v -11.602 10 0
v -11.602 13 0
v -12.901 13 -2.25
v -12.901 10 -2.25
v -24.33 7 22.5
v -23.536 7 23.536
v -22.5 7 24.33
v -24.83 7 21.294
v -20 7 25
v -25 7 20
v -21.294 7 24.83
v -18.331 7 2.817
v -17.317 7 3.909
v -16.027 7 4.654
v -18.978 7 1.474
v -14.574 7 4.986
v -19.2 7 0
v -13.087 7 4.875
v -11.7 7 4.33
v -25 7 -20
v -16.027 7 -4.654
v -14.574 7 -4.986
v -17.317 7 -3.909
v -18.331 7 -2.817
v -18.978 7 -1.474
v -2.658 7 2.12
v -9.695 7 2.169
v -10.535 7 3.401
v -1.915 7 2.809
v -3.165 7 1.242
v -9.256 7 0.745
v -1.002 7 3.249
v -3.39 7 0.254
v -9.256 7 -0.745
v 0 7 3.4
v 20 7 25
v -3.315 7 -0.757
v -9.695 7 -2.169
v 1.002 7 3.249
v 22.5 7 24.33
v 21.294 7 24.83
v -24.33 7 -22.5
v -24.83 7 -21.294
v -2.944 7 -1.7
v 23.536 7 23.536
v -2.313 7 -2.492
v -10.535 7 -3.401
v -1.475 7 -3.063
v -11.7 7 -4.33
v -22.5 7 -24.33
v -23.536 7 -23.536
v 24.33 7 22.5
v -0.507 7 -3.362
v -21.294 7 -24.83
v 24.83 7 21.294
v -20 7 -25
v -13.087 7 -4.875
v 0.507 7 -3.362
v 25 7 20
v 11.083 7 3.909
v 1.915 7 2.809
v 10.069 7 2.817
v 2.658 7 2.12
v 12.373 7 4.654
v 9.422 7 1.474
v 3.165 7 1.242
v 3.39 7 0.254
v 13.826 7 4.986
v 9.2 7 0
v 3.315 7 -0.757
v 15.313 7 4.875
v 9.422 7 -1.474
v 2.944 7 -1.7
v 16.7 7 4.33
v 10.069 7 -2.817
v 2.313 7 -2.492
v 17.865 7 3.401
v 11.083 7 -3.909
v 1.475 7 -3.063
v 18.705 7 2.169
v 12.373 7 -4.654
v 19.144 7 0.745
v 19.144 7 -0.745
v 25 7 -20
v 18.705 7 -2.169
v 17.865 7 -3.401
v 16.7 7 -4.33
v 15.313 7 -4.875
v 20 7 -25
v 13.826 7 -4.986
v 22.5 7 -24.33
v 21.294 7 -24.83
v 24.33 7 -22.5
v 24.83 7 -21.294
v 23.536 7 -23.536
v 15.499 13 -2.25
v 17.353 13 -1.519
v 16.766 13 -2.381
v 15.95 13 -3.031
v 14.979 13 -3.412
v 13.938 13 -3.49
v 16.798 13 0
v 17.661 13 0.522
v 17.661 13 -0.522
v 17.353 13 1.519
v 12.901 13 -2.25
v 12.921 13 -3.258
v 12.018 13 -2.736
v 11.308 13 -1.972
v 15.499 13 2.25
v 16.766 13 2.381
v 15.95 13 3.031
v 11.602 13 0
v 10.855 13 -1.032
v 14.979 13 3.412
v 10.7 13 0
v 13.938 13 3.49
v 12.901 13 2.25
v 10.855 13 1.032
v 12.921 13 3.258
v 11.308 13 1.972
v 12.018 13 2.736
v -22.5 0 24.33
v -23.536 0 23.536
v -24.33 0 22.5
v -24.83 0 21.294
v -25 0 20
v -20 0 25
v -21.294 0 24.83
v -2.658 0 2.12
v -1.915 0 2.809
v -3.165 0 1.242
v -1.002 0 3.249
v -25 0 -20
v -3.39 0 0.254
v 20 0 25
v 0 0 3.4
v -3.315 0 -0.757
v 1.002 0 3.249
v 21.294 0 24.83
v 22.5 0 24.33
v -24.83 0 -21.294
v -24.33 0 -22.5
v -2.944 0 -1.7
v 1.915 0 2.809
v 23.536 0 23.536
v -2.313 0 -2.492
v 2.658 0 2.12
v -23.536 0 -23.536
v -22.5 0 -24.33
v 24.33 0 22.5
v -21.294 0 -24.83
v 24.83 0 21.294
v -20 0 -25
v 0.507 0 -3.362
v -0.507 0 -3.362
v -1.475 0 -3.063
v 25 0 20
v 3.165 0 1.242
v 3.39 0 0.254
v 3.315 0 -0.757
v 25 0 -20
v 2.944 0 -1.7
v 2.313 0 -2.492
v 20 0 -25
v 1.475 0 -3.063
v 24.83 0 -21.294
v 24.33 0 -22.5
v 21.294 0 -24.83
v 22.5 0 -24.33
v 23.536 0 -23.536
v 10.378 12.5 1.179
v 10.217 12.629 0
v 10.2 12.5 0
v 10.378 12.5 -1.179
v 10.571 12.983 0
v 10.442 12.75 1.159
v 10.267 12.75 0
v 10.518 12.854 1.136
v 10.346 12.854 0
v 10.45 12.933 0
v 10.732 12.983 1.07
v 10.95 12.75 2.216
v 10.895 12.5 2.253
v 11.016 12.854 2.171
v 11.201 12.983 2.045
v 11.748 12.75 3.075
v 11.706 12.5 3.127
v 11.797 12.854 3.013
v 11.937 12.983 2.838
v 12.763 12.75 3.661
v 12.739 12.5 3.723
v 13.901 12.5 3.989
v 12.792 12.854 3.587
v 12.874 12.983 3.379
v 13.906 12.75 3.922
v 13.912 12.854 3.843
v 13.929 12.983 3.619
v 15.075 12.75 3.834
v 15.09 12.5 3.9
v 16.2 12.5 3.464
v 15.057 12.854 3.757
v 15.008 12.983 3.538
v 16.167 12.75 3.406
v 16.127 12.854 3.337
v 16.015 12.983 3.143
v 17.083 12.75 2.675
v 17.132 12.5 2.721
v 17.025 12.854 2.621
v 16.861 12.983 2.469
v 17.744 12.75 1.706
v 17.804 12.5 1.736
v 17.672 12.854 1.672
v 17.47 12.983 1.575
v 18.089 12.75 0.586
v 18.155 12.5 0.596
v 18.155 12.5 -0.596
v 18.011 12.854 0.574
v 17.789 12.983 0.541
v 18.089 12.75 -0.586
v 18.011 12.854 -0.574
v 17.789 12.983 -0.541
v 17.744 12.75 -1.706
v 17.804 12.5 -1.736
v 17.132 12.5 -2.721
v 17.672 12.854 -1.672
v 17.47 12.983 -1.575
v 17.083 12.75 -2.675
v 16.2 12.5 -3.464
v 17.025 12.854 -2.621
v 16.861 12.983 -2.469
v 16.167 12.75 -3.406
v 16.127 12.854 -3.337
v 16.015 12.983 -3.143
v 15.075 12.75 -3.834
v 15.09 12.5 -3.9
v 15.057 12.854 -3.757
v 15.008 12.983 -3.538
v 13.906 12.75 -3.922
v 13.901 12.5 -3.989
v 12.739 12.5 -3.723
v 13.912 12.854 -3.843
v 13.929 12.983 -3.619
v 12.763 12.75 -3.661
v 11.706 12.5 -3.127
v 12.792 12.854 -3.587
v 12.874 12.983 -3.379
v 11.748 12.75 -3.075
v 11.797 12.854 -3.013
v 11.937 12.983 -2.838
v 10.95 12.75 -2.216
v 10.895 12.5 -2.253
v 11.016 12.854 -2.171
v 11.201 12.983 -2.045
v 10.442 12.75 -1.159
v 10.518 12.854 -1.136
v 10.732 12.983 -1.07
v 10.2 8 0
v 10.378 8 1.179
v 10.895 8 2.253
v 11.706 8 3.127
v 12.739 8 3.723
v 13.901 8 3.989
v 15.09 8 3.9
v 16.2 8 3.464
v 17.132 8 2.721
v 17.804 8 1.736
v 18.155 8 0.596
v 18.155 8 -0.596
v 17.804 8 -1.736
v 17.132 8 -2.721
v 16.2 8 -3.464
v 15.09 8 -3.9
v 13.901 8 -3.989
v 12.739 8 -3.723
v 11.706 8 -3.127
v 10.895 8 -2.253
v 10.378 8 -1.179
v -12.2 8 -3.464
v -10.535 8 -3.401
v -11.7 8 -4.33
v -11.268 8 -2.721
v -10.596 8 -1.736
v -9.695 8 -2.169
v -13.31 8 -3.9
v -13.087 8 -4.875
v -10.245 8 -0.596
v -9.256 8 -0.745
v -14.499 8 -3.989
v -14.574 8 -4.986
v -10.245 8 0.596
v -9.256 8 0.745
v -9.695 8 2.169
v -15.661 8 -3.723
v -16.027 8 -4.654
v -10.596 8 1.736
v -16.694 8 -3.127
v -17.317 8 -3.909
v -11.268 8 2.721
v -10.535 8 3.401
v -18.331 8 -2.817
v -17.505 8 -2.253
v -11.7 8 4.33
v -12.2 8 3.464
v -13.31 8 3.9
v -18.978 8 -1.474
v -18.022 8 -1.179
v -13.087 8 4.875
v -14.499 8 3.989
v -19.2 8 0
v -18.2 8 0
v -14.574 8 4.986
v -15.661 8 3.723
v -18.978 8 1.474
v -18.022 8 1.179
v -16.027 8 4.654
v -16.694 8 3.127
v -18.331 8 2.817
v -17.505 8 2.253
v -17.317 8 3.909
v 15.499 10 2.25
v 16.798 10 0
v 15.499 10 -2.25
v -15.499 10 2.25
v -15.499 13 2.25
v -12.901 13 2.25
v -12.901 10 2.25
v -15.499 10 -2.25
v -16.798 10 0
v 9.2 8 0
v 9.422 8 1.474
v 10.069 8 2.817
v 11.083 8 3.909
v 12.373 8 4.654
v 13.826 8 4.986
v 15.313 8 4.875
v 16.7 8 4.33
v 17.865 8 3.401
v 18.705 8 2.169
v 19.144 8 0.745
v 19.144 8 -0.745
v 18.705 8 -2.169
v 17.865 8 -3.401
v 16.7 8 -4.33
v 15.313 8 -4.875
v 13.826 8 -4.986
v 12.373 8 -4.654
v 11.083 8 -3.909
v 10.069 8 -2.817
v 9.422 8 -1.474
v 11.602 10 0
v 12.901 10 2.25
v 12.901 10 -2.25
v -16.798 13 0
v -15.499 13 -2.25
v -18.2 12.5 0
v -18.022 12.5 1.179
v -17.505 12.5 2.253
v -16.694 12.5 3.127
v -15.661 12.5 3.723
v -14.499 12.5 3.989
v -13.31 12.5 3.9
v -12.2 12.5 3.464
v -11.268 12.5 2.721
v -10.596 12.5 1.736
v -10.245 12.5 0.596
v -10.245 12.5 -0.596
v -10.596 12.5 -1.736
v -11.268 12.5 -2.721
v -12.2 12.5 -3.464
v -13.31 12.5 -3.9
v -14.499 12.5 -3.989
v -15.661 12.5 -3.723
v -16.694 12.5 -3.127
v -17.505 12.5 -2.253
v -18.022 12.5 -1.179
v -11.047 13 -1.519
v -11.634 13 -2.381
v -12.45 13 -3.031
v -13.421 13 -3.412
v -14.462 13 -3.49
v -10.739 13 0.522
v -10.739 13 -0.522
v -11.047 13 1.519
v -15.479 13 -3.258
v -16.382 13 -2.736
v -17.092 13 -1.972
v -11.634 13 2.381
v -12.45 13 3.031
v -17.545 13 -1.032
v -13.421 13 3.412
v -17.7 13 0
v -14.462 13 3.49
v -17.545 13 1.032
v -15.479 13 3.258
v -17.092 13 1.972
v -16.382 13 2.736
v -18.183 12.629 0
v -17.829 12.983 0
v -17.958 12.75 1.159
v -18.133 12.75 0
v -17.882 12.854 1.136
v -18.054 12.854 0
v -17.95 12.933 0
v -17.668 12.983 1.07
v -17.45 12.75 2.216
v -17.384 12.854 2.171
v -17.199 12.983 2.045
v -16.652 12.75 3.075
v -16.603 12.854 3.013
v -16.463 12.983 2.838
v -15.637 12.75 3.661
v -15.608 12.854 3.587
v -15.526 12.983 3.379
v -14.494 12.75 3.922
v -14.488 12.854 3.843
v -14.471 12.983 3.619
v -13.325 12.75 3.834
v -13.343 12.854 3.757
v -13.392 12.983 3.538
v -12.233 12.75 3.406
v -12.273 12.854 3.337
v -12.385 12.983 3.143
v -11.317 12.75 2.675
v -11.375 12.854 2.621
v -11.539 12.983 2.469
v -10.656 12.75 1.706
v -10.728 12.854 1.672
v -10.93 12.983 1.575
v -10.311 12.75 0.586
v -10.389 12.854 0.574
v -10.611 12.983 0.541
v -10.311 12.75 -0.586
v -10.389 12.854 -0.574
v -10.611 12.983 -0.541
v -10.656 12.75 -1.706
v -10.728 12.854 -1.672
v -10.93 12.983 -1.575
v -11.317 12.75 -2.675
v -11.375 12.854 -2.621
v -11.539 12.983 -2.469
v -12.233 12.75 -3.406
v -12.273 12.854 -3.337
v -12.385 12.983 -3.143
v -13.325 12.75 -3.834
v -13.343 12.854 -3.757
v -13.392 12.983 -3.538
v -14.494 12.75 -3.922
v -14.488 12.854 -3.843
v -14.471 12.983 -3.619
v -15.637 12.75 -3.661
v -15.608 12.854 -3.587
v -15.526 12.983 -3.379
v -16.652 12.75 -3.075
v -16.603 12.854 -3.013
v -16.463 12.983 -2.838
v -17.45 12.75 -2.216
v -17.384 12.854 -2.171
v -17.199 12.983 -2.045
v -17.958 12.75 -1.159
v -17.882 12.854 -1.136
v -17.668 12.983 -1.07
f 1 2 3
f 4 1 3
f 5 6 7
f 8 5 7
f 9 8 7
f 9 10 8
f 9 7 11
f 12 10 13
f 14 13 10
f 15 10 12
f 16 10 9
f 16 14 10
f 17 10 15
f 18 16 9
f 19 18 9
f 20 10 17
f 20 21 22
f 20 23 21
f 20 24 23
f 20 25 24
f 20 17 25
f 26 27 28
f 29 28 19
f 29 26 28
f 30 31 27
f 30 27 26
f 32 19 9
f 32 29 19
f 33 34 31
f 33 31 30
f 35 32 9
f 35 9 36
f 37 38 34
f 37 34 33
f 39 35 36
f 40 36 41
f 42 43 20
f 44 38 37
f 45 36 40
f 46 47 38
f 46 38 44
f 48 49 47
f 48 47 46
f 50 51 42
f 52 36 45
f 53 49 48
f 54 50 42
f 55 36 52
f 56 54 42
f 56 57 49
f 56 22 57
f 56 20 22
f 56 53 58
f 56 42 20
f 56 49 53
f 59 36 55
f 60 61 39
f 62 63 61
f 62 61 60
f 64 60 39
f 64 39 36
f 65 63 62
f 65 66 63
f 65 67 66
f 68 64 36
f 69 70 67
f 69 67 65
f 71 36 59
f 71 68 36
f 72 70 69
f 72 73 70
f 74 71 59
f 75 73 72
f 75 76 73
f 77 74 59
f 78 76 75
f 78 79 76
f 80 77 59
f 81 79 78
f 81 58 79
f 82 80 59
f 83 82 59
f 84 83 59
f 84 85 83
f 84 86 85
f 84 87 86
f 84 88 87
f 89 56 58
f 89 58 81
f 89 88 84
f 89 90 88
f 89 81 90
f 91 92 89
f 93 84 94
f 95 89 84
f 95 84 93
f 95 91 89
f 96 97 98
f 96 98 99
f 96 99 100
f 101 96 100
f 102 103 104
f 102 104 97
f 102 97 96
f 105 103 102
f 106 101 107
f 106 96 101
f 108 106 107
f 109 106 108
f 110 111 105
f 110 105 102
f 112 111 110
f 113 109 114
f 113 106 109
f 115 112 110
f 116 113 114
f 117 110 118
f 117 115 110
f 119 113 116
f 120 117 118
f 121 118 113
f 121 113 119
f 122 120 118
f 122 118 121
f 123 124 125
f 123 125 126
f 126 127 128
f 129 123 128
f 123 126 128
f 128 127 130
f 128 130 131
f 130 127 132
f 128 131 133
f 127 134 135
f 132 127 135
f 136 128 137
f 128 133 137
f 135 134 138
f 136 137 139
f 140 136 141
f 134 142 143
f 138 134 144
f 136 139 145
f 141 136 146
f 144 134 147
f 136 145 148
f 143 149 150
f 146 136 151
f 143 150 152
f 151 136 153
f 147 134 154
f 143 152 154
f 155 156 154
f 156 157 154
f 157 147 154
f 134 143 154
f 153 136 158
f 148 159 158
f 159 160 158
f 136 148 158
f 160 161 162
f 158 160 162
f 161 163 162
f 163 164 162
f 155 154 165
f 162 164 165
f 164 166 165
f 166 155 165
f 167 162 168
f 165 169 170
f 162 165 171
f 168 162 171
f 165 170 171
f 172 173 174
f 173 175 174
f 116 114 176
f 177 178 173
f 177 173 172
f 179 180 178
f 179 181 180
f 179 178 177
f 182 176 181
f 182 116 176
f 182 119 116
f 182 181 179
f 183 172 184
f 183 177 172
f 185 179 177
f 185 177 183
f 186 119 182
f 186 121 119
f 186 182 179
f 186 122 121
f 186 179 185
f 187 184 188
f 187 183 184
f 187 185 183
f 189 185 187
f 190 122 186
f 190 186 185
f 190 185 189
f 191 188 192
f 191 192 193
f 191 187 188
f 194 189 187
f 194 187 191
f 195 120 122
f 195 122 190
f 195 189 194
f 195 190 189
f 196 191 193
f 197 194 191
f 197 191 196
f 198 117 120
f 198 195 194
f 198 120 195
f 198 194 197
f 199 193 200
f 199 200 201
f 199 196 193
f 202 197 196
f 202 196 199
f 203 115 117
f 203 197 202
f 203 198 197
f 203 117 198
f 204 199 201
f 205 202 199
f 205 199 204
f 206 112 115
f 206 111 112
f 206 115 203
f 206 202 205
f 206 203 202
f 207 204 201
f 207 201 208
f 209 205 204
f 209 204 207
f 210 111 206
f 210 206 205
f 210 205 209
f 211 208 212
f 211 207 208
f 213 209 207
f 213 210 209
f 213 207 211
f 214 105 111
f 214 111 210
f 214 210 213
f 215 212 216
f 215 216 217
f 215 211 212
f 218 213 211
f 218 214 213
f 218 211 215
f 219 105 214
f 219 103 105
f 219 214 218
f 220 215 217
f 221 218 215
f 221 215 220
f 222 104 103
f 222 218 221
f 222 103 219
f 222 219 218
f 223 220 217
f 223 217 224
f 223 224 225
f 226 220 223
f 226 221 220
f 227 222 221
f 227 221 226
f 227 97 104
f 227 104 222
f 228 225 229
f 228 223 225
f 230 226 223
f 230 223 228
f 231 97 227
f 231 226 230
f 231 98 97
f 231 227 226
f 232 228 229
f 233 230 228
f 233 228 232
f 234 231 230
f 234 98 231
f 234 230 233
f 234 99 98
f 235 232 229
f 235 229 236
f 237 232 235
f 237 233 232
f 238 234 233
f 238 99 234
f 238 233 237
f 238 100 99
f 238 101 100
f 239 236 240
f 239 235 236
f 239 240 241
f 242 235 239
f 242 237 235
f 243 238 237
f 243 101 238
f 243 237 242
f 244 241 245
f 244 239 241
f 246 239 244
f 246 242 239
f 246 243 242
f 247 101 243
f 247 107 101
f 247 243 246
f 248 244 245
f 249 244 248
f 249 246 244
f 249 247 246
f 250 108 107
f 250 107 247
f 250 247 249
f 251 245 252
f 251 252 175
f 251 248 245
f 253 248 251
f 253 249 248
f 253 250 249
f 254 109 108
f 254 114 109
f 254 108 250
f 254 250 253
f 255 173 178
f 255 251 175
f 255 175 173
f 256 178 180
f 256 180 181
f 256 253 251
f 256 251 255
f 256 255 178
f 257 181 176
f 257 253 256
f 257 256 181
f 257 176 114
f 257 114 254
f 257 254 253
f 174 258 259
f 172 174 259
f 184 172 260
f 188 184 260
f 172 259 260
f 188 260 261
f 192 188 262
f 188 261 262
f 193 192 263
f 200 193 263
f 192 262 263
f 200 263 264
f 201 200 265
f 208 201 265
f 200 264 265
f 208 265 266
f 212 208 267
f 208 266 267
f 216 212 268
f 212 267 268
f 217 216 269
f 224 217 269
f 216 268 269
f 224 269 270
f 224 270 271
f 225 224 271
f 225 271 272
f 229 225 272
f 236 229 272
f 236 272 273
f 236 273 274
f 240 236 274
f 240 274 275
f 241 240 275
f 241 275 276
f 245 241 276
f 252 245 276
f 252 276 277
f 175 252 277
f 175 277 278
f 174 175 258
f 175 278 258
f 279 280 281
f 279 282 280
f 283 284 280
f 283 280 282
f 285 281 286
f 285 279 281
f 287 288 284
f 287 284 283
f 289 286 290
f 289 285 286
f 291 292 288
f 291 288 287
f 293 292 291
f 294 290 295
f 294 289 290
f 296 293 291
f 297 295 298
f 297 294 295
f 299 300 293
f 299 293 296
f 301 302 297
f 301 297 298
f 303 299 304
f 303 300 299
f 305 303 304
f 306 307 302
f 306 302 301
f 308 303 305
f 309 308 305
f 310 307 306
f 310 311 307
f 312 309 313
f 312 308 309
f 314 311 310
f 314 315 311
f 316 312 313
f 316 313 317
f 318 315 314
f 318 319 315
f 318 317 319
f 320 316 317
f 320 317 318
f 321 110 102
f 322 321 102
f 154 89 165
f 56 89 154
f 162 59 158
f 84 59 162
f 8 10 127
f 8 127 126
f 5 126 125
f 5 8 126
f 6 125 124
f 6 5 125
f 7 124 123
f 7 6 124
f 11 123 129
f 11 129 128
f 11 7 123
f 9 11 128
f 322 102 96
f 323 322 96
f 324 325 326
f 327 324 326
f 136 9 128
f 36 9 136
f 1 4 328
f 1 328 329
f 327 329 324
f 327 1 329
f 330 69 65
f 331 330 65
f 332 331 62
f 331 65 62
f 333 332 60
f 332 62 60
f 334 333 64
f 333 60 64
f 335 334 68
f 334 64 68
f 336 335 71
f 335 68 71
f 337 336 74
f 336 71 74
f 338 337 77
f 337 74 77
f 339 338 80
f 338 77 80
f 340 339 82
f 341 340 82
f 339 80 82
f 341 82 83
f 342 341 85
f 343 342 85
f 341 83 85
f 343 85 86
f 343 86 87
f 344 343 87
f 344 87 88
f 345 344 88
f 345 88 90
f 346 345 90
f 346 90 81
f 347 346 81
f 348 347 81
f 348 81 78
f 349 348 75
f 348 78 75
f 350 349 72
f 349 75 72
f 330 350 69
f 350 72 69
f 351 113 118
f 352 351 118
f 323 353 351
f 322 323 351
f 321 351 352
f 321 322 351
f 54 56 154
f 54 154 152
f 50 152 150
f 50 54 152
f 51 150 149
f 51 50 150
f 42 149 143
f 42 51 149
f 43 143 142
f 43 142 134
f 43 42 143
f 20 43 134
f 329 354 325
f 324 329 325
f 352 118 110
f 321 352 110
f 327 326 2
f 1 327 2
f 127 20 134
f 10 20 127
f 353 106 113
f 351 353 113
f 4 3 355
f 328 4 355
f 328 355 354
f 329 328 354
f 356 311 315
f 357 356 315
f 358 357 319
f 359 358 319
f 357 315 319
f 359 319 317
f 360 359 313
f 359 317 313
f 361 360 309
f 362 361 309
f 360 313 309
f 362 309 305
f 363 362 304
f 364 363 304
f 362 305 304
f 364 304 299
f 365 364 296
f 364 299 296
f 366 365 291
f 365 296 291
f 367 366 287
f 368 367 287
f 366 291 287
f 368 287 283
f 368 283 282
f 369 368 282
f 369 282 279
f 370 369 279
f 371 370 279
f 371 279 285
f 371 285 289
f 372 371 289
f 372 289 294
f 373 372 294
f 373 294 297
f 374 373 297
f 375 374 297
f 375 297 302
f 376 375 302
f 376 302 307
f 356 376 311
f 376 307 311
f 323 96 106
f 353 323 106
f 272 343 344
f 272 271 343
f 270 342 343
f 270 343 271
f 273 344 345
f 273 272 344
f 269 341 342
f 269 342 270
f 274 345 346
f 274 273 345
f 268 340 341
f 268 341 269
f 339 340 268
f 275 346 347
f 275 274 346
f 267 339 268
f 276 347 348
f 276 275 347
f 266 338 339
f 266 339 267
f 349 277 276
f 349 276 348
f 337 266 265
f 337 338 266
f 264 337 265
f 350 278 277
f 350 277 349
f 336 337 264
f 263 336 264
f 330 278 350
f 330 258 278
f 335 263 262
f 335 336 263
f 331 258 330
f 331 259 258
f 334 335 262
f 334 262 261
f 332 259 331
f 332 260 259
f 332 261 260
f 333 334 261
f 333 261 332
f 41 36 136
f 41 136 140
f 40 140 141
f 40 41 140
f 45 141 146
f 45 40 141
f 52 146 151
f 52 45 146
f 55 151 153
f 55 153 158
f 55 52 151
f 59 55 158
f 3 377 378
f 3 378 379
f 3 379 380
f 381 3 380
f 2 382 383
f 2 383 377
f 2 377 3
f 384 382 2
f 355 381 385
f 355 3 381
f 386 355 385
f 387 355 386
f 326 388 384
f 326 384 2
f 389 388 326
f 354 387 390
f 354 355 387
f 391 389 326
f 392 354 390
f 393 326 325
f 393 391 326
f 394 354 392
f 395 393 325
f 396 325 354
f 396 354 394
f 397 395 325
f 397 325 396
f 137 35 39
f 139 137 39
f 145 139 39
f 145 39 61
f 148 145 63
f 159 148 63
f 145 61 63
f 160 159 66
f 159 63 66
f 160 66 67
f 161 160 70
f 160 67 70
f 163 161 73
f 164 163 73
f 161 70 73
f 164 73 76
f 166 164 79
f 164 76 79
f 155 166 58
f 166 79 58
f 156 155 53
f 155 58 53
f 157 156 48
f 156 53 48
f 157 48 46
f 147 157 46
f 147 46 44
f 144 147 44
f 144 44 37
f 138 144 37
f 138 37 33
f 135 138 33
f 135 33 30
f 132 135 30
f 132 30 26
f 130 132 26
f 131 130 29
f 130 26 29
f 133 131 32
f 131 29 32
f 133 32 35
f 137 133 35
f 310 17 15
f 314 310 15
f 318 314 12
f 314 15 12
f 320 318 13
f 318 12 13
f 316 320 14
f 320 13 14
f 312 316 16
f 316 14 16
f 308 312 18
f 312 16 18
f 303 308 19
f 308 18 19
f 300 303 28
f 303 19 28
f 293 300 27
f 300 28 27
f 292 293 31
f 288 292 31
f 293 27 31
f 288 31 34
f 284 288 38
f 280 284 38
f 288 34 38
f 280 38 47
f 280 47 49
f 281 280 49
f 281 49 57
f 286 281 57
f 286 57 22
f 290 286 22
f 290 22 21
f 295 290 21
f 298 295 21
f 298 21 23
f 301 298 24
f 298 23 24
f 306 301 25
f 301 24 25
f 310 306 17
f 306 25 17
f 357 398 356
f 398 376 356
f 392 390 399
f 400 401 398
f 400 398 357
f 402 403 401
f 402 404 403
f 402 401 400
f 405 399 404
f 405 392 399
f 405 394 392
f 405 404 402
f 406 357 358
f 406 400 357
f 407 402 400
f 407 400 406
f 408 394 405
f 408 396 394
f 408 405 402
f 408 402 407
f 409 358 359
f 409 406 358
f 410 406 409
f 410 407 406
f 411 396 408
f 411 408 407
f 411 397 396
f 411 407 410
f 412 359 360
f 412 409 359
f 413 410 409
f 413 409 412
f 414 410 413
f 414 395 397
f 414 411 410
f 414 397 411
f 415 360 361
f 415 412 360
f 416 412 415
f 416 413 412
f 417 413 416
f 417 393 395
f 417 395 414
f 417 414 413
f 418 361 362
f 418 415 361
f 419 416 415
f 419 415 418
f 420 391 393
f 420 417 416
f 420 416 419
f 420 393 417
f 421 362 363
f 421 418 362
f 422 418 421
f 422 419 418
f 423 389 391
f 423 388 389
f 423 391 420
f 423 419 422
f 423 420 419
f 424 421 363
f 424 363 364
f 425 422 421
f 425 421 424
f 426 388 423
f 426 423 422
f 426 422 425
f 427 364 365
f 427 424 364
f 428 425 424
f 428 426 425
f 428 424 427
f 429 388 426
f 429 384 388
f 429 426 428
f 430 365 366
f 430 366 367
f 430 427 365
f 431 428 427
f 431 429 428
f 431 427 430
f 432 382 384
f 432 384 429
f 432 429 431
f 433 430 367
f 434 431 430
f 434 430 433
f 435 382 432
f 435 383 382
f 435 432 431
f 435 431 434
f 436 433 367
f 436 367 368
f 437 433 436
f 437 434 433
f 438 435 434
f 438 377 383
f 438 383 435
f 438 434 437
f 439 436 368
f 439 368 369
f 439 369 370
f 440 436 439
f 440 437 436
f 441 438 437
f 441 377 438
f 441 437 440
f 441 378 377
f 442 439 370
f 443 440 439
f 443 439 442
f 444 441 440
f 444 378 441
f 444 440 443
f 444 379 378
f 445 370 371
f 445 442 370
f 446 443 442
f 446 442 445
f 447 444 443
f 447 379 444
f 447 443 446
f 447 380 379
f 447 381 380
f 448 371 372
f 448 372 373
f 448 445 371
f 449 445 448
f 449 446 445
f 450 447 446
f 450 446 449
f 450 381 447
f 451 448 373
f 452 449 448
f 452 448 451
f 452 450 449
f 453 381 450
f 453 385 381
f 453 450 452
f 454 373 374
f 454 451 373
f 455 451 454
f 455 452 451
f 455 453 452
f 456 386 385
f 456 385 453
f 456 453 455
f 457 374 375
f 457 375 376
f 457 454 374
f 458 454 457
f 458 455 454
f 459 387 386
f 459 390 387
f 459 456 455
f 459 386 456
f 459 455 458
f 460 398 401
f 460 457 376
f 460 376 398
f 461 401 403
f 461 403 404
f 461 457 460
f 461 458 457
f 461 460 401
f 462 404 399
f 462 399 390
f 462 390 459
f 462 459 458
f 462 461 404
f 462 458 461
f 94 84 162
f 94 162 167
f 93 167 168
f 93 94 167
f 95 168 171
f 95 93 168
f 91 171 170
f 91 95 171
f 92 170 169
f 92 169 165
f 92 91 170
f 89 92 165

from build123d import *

# Parameters (mm, degrees)
SKETCH1_R                = 3.4
BOSS_EXTRUDE1_DEPTH      = 7
SKETCH4_R                = 5
BOSS_EXTRUDE2_DEPTH      = 1
SKETCH5_R                = 4
BOSS_EXTRUDE3_DEPTH      = 5
CUT_EXTRUDE1_DEPTH       = 3
FILLET1_R                = 0.5
CIRPATTERN1_COUNT        = 2
CIRPATTERN1_ANGLE        = 90
FILLET1_OF_CIRPATTERN1_R = 0.5
SKETCH7_W                = 13.377916116
SKETCH7_H                = 10.003544581
SKETCH7_W_2              = 13.109283262
SKETCH7_H_2              = 10.863169713
CUT_EXTRUDE2_DEPTH       = 58.393379409


# Read off the part's stored shape, not the designer's step: Imported1
with BuildPart() as part:
    # Sketch1 → Boss-Extrude1 (new body)
    with BuildSketch(Plane(origin=(0, 7, 0), x_dir=(1, 0, 0), z_dir=(0, 1, 0))):
        with BuildLine():
            Line((-25, 20), (-25, -20))
            ThreePointArc((-25, -20), (-23.535533906, -23.535533906), (-20, -25))
            Line((-20, -25), (20, -25))
            ThreePointArc((20, -25), (23.535533906, -23.535533906), (25, -20))
            Line((25, -20), (25, 20))
            ThreePointArc((25, 20), (23.535533906, 23.535533906), (20, 25))
            Line((20, 25), (-20, 25))
            ThreePointArc((-20, 25), (-23.535533906, 23.535533906), (-25, 20))
        make_face()
        with Locations(Location((0, 0, 0), (0, 0, 270))):
            Circle(SKETCH1_R, mode=Mode.SUBTRACT)
    extrude(amount=-BOSS_EXTRUDE1_DEPTH)

    # Sketch4 → Boss-Extrude2 (add)
    with BuildSketch(Plane(origin=(0, 7, 0), x_dir=(1, 0, 0), z_dir=(0, 1, 0))):
        with Locations(Location((0, 14.2, 0), (0, 0, 270))):
            Circle(SKETCH4_R)
        with Locations(Location((0, -14.2, 0), (0, 0, 270))):
            Circle(SKETCH4_R)
    boss_extrude2 = extrude(amount=BOSS_EXTRUDE2_DEPTH)

    # Sketch5 → Boss-Extrude3 (add)
    with BuildSketch(Plane(origin=(0, 8, 0), x_dir=(1, 0, 0), z_dir=(0, 1, 0))):
        with Locations(Location((0, 14.2, 0), (0, 0, 270))):
            Circle(SKETCH5_R)
        with Locations(Location((0, -14.2, 0), (0, 0, 270))):
            Circle(SKETCH5_R)
    boss_extrude3 = extrude(amount=BOSS_EXTRUDE3_DEPTH)

    # Sketch6 → Cut-Extrude1 (cut)
    with BuildSketch(Plane(origin=(0, 13, 0), x_dir=(1, 0, 0), z_dir=(0, 1, 0))):
        Polygon((0, 16.798076211), (-2.25, 15.499038106), (-2.25, 12.900961894), (0, 11.601923789), (2.25, 12.900961894), (2.25, 15.499038106), align=None)
        Polygon((0, -11.601923789), (-2.25, -12.900961894), (-2.25, -15.499038106), (0, -16.798076211), (2.25, -15.499038106), (2.25, -12.900961894), align=None)
    cut_extrude1 = extrude(amount=-CUT_EXTRUDE1_DEPTH, mode=Mode.SUBTRACT)

    # Fillet1
    fillet1_edges = [part.edges().sort_by_distance(p)[0] for p in [
        (0, 13, -18.2),
        (0, 13, 10.2),
    ]]
    fillet(fillet1_edges, radius=FILLET1_R)

    # CirPattern1: Boss-Extrude2, Boss-Extrude3, Cut-Extrude1 ×2 about axis
    cirpattern1_axis = Axis((0, 0, 0), (0, -1, 0))
    add([boss_extrude2.rotate(cirpattern1_axis, i * CIRPATTERN1_ANGLE / (CIRPATTERN1_COUNT - 1)) for i in range(1, CIRPATTERN1_COUNT)])
    add([boss_extrude3.rotate(cirpattern1_axis, i * CIRPATTERN1_ANGLE / (CIRPATTERN1_COUNT - 1)) for i in range(1, CIRPATTERN1_COUNT)])
    add([cut_extrude1.rotate(cirpattern1_axis, i * CIRPATTERN1_ANGLE / (CIRPATTERN1_COUNT - 1)) for i in range(1, CIRPATTERN1_COUNT)], mode=Mode.SUBTRACT)

    # Fillet1 of CirPattern1
    fillet1_of_cirpattern1_edges = [part.edges().sort_by_distance(p)[0] for p in [
        (18.2, 13, 0),
        (-10.2, 13, 0),
    ]]
    fillet(fillet1_of_cirpattern1_edges, radius=FILLET1_OF_CIRPATTERN1_R)

    # Sketch7 → Cut-Extrude2 (cut, through all)
    with BuildSketch(Plane(origin=(25, 0, 0), x_dir=(0, 0, -1), z_dir=(1, 0, 0))):
        with Locations((14.04949825, 12.00177229)):
            Rectangle(SKETCH7_W, SKETCH7_H)
        with Locations((-13.592822399, 12.431584857)):
            Rectangle(SKETCH7_W_2, SKETCH7_H_2)
    extrude(amount=-CUT_EXTRUDE2_DEPTH, mode=Mode.SUBTRACT)


solid = part.part
